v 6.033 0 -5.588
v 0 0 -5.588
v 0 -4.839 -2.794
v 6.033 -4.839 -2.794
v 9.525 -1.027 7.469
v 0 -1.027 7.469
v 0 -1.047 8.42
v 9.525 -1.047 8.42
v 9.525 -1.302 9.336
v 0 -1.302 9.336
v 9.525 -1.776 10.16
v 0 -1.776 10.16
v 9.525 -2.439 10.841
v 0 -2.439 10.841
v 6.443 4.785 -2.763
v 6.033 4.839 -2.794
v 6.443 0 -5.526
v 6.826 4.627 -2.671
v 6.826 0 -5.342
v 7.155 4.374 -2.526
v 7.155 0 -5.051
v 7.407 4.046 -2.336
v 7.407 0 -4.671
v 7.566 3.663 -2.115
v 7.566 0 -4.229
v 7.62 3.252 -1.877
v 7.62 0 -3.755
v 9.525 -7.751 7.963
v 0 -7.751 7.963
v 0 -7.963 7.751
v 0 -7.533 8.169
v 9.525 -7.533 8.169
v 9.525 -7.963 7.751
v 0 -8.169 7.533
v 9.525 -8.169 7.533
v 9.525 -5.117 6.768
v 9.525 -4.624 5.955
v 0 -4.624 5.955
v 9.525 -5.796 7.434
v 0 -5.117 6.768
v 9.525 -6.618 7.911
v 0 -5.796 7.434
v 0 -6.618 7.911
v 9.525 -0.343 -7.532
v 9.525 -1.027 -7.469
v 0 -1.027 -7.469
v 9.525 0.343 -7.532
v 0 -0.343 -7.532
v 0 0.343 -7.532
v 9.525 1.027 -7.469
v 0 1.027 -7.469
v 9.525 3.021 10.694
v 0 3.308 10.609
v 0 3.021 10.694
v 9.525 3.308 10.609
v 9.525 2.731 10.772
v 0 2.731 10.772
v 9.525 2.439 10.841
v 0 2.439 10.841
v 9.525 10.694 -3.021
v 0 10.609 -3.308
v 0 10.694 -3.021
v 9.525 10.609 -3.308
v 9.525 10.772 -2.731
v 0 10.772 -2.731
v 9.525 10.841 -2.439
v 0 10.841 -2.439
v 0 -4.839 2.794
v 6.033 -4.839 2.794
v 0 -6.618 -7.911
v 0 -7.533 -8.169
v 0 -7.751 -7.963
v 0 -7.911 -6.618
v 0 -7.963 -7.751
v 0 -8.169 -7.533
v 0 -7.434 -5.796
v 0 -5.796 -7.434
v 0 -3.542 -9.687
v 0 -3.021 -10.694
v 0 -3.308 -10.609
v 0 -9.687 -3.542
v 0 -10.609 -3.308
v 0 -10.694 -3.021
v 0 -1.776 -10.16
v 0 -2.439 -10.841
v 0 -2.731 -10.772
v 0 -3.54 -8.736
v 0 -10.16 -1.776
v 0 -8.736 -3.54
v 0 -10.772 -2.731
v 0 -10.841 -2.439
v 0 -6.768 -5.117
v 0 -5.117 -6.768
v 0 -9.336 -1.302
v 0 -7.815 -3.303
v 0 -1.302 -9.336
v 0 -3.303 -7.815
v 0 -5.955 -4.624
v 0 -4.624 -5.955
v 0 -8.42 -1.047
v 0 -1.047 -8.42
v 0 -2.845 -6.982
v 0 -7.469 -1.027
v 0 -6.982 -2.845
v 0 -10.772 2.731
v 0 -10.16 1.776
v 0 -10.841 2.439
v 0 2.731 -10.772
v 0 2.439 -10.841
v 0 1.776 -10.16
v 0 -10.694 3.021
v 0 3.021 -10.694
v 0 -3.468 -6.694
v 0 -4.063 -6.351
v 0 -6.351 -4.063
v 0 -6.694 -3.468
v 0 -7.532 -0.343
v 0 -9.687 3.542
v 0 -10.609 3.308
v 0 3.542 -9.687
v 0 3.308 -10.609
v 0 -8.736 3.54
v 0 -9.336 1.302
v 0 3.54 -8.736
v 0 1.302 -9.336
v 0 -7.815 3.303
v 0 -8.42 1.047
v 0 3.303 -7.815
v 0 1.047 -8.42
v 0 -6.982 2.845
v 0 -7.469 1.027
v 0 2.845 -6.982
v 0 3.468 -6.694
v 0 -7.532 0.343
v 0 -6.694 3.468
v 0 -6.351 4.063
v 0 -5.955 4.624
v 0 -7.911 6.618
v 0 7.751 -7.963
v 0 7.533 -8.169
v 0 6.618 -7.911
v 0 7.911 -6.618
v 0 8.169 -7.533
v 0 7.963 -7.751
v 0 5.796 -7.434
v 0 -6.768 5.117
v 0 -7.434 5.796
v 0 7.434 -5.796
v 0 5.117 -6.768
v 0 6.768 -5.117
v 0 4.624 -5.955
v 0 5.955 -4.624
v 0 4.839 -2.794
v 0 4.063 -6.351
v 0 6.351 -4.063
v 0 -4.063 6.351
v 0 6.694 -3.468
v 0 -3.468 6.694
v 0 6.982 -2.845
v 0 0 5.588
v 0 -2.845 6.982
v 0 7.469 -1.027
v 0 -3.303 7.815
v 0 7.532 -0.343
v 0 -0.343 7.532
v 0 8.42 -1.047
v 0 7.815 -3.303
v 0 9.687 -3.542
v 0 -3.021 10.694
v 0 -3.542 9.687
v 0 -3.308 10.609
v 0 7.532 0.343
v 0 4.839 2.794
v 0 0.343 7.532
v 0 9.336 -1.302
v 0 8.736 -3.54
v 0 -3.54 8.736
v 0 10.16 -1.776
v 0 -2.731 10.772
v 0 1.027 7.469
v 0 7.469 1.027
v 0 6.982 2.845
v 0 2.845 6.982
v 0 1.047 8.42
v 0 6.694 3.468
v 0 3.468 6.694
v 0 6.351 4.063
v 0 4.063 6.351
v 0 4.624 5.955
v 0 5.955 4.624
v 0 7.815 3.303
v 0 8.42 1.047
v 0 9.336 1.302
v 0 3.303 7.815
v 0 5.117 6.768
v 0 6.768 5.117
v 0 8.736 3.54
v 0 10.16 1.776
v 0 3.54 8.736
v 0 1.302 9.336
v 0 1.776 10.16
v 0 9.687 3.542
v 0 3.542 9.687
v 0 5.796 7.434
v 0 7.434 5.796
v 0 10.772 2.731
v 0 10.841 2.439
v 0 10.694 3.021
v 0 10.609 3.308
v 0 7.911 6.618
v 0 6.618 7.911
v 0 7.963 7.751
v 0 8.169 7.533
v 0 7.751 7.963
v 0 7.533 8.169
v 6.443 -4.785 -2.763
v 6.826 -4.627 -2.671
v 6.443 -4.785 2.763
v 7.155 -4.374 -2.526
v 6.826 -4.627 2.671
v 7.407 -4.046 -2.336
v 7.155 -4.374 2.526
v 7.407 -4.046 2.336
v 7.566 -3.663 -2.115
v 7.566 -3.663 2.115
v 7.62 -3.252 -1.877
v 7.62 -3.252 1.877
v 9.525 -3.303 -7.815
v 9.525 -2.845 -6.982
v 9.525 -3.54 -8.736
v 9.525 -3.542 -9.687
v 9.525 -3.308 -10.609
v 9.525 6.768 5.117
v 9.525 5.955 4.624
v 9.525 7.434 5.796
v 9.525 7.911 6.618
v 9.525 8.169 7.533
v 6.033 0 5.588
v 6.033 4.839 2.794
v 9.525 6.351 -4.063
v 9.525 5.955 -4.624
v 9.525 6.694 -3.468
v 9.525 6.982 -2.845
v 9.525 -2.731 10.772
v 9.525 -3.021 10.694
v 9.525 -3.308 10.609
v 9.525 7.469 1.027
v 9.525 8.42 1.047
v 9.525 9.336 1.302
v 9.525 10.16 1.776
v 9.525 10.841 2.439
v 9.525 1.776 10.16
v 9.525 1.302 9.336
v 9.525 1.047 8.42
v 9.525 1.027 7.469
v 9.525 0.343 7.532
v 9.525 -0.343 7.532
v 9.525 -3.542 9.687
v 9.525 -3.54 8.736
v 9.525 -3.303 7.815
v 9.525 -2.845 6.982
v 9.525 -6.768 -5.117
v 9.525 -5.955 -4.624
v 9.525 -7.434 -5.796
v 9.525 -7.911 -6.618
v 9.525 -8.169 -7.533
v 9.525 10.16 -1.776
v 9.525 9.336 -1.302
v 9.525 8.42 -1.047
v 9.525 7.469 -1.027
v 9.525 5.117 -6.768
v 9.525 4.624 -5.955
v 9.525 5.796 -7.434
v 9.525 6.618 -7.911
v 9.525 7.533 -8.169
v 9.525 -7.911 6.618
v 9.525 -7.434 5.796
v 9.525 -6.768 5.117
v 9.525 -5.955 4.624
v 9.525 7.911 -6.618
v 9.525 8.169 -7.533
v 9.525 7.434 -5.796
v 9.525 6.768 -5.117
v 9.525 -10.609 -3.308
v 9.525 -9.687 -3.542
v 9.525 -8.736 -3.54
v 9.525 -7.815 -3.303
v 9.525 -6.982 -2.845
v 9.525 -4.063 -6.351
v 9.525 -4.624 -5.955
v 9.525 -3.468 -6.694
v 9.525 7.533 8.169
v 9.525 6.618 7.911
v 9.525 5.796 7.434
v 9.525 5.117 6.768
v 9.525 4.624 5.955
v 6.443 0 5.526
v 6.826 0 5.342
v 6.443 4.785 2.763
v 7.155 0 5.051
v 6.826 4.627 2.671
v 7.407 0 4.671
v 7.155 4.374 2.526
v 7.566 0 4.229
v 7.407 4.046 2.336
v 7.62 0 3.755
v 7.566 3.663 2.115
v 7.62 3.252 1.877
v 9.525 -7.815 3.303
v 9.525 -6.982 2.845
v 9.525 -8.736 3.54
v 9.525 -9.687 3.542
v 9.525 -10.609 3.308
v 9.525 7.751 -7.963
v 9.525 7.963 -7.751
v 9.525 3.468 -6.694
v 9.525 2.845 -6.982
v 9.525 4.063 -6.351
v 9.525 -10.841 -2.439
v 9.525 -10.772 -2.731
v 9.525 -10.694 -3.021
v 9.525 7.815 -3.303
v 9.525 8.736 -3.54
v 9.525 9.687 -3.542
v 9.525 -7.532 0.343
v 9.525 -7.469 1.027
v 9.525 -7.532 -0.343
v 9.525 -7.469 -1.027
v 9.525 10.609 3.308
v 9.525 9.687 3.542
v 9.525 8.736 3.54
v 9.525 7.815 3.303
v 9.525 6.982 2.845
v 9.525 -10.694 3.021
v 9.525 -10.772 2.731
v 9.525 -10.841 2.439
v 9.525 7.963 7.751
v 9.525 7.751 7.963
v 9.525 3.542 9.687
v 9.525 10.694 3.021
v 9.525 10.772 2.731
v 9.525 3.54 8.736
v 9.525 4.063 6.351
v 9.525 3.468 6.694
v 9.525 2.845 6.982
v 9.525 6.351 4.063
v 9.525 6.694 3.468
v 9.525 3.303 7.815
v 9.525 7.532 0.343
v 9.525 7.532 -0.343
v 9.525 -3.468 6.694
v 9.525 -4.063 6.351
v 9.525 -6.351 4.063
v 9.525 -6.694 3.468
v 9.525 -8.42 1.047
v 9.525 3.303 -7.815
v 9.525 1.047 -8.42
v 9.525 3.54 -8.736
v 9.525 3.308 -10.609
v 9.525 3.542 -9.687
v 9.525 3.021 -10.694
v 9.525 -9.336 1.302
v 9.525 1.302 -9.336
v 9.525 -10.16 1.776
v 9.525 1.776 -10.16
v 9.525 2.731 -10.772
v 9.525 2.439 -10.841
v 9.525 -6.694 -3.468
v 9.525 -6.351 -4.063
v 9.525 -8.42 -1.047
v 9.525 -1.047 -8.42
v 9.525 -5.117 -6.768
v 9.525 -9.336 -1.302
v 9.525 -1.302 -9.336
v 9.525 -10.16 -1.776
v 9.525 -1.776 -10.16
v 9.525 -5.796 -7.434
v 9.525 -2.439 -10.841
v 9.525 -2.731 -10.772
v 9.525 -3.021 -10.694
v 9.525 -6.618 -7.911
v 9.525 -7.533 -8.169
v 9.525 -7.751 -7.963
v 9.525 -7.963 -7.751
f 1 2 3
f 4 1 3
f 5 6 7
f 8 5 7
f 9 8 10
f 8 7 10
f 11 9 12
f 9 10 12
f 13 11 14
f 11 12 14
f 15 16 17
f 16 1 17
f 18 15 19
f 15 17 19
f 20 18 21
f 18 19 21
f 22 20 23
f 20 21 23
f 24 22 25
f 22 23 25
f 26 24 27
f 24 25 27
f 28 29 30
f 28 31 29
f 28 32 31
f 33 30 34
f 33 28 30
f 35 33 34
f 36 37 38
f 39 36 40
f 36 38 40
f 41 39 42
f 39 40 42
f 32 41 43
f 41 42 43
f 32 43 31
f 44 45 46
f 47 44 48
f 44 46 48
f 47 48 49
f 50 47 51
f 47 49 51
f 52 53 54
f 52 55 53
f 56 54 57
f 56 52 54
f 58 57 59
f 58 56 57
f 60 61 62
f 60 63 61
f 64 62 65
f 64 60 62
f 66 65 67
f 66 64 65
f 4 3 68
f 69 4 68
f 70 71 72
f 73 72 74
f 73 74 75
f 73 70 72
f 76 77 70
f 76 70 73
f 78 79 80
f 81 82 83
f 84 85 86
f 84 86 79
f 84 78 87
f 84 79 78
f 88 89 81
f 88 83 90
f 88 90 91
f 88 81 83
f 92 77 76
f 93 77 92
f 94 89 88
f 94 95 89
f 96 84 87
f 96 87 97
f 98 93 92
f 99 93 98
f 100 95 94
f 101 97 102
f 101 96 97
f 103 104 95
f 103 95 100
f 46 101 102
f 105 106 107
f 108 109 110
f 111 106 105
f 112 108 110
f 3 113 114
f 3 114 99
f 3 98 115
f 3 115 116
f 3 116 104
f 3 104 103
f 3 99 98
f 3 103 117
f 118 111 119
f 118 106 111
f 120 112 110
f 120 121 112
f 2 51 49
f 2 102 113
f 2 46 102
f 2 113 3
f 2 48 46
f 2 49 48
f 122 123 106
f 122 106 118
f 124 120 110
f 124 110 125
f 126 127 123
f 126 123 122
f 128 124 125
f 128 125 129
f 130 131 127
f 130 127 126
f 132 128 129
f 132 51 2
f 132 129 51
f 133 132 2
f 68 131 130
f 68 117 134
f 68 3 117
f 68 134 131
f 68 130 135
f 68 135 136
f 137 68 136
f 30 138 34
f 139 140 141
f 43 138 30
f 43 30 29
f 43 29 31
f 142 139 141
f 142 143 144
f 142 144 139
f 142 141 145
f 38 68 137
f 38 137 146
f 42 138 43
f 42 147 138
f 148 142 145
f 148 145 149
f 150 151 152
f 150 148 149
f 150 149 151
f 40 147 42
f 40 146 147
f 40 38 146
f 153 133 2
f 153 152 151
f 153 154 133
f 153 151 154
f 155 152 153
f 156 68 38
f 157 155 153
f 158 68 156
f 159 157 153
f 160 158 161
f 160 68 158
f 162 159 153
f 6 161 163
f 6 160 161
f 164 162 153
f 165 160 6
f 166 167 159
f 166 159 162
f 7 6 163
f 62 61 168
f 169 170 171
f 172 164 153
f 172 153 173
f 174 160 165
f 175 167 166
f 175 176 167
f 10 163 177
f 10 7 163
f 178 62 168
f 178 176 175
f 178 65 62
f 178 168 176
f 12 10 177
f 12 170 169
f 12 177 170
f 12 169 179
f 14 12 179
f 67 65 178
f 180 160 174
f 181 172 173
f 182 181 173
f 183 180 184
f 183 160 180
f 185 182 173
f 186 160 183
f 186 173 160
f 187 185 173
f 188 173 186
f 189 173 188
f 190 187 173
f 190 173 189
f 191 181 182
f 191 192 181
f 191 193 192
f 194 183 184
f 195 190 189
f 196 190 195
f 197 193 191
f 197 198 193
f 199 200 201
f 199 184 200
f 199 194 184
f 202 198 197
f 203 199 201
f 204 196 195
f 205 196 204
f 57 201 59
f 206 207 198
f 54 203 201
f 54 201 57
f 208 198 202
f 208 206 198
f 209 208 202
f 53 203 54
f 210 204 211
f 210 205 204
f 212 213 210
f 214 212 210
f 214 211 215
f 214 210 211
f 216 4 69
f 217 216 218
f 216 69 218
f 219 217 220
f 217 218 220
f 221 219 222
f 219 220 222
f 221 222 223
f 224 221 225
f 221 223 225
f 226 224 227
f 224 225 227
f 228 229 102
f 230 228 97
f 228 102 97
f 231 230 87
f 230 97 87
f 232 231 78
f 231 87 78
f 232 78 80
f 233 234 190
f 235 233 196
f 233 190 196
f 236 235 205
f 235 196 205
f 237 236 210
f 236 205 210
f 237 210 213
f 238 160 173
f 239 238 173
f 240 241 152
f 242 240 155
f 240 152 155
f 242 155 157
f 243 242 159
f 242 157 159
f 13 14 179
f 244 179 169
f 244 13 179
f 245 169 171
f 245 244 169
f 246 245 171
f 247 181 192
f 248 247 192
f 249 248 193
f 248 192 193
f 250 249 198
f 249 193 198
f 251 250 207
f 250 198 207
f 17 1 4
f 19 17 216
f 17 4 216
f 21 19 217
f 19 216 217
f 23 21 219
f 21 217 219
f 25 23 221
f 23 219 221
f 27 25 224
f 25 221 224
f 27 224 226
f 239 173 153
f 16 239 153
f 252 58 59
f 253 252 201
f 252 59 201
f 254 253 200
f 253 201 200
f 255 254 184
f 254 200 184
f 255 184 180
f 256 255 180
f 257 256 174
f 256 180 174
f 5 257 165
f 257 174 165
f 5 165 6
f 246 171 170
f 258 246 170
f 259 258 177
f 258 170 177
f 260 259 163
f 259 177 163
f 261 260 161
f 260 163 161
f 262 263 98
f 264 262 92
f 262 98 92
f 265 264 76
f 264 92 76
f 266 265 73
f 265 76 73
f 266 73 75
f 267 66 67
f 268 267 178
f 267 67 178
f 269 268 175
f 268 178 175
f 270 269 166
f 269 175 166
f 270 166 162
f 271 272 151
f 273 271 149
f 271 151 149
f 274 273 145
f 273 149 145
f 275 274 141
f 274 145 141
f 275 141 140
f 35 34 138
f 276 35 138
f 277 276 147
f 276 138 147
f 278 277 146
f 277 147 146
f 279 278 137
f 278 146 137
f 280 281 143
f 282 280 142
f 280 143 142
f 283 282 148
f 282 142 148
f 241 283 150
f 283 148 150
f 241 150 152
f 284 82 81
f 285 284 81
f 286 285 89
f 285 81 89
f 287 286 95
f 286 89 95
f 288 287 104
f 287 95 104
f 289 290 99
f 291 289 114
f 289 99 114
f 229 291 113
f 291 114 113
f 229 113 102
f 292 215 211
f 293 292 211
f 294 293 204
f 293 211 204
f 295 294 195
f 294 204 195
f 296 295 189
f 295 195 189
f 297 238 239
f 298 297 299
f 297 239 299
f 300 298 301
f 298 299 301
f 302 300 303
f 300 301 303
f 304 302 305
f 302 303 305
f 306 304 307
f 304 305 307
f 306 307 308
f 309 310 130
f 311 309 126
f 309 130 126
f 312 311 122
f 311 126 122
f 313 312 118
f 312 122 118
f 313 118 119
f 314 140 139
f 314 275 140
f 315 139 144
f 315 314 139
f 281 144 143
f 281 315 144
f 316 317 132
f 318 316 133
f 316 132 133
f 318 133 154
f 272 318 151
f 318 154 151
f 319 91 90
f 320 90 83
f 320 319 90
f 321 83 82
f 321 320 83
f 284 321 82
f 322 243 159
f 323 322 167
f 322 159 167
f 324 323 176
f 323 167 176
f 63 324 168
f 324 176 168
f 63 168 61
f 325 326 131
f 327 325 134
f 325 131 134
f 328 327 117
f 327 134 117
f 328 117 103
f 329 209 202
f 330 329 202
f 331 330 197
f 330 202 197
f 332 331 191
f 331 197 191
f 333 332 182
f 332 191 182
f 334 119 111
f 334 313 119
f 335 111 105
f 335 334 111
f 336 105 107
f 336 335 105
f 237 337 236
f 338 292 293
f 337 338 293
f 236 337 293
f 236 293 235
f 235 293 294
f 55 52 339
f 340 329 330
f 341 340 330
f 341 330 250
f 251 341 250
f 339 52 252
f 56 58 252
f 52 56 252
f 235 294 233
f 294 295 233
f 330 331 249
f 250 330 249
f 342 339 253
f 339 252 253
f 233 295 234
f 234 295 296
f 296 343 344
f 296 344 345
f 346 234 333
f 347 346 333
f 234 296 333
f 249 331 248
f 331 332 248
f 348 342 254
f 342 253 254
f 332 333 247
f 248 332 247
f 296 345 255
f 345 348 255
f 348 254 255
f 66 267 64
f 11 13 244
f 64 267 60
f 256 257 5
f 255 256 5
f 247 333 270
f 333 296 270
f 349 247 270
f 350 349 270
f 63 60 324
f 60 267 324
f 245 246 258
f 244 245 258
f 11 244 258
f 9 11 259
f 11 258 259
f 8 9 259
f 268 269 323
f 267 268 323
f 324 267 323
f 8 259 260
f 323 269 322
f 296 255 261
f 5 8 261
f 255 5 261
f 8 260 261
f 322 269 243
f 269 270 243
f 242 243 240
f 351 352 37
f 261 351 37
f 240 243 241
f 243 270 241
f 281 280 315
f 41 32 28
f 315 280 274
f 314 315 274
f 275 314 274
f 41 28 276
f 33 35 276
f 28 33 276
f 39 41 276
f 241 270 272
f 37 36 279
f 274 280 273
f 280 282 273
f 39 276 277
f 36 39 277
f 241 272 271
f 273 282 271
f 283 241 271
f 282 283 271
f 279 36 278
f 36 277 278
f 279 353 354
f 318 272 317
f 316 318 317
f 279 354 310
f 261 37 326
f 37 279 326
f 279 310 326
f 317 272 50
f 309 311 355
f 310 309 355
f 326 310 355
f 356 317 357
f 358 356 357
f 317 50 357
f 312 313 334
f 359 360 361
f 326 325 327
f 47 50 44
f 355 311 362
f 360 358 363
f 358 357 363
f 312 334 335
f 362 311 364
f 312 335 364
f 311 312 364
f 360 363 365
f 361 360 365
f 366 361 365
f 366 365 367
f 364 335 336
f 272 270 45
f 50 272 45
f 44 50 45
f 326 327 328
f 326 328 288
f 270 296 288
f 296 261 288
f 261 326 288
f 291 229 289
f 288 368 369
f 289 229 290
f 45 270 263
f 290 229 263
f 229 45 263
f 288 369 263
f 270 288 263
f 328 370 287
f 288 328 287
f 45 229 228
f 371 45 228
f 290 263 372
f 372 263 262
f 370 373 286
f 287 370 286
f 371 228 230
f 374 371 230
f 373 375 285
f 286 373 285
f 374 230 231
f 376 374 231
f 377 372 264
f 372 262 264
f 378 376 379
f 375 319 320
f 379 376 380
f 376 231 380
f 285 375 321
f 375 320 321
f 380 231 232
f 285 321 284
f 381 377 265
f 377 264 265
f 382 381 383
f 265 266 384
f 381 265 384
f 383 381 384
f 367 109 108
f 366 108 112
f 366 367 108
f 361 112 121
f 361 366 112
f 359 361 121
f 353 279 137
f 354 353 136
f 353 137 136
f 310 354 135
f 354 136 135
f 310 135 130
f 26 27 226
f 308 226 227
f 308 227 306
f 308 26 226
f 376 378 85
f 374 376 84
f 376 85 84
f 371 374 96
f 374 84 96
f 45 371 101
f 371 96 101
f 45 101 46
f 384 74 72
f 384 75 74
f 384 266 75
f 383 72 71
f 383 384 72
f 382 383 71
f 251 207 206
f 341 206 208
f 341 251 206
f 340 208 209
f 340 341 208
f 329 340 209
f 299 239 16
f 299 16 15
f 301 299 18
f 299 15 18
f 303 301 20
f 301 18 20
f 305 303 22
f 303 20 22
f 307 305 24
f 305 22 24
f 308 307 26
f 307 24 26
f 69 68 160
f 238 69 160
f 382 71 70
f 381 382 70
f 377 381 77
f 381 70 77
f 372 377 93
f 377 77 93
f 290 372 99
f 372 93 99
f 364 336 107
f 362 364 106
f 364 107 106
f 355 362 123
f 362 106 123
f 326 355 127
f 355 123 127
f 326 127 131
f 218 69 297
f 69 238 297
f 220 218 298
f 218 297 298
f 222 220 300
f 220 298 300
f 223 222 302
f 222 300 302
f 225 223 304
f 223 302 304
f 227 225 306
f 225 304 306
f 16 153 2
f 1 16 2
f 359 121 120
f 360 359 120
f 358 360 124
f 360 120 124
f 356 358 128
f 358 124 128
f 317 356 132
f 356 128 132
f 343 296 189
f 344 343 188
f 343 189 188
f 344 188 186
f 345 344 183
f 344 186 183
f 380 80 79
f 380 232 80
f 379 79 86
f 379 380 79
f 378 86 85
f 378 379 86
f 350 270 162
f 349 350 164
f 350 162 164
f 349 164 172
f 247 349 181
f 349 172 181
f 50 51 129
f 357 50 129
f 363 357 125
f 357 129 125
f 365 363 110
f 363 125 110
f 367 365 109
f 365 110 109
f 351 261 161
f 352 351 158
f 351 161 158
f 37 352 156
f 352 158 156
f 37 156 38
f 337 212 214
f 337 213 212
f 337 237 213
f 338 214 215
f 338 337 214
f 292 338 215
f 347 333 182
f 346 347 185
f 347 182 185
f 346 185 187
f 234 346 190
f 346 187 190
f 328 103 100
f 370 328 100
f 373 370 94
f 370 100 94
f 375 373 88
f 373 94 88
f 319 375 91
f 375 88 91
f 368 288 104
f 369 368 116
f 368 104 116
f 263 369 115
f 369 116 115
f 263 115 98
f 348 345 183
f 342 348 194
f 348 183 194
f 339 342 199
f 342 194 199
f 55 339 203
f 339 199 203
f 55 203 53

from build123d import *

# Parameters (mm, degrees)
BASPROSKE_W         = 9.525
BASPROSKE_H         = 11.1125
TOOTHCUT_DEPTH      = 19.376641083
TEETHCUTS_COUNT     = 12
BORSKE_R            = 3.175
BORE_DEPTH          = 9.525
BOSS_EXTRUDE1_START = -25.4
SKETCH2_R           = 7.539355
BOSS_EXTRUDE1_DEPTH = 25.4
CUT_EXTRUDE1_DEPTH  = 20
SKETCH5_R           = 1.905
CUT_EXTRUDE2_DEPTH  = 24.605363577
SKETCH6_R           = 12.7
SKETCH6_R_2         = 5.7785
CUT_EXTRUDE3_DEPTH  = 15.875
SKETCH7_R           = 5.7785
CUT_EXTRUDE4_DEPTH  = 23.070094739
BOSS_EXTRUDE2_START = 4.125
BOSS_EXTRUDE2_DEPTH = 4.125
CUT_EXTRUDE5_DEPTH  = 7.62
FILLET1_R           = 1.5875


with BuildPart() as part:
    # BasProSke → Base-Revolve (revolve)
    with BuildSketch(Plane(origin=(0, 0, 0), x_dir=(1, 0, 0), z_dir=(0, 1, 0)), mode=Mode.PRIVATE) as base_revolve_sk:
        with Locations((4.7625, 5.55625)):
            Rectangle(BASPROSKE_W, BASPROSKE_H)
    revolve(base_revolve_sk.sketch.rotate(Axis((-10, 0, 0), (1, 0, 0)), 180), axis=Axis((-10, 0, 0), (1, 0, 0)))

    # TooCutSke → ToothCut (cut, through all)
    with BuildSketch(Plane(origin=(0, 0, 0), x_dir=(0, 0, -1), z_dir=(1, 0, 0))):
        with BuildLine():
            ThreePointArc((1.026937745, 7.469087808), (0, 7.539355), (-1.026937745, 7.469087808))
            ThreePointArc((-1.026937745, 7.469087808), (-1.30857978, 9.35080814), (-2.465050847, 10.861691431))
            ThreePointArc((-2.465050847, 10.861691431), (0, 11.1379), (2.465050847, 10.861691431))
            ThreePointArc((2.465050847, 10.861691431), (1.30857978, 9.35080814), (1.026937745, 7.469087808))
        make_face()
    toothcut = extrude(amount=TOOTHCUT_DEPTH, mode=Mode.SUBTRACT)

    # TeethCuts: ToothCut ×12 about axis
    teethcuts_axis = Axis((0, 0, 0), (1, 0, 0))
    for i in range(1, TEETHCUTS_COUNT):
        add(toothcut.rotate(teethcuts_axis, i * 360 / TEETHCUTS_COUNT), mode=Mode.SUBTRACT)

    # BorSke → Bore (cut, symmetric)
    with BuildSketch(Plane(origin=(0, 0, 0), x_dir=(0, 0, -1), z_dir=(1, 0, 0))):
        with Locations(Location((0, 0, 0), (0, 0, 180))):
            Circle(BORSKE_R)
    extrude(amount=BORE_DEPTH, both=True, mode=Mode.SUBTRACT)

    # Sketch2 → Boss-Extrude1 (add)
    with BuildSketch(Plane(origin=(9.525, 0, 0), x_dir=(0, 0, -1), z_dir=(1, 0, 0)).offset(BOSS_EXTRUDE1_START)):
        with Locations(Location((0, 0, 0), (0, 0, 172.171388978))):
            Circle(SKETCH2_R)
    extrude(amount=BOSS_EXTRUDE1_DEPTH)

    # Sketch3 → Cut-Extrude1 (cut)
    with BuildSketch(Plane.ZY.offset(15.875)):
        with BuildLine():
            Line((-1.778, 2.8575), (1.778, 2.8575))
            ThreePointArc((1.778, 2.8575), (0, -3.3655), (-1.778, 2.8575))
        make_face()
    extrude(amount=-CUT_EXTRUDE1_DEPTH, mode=Mode.SUBTRACT)

    # Sketch5 → Cut-Extrude2 (cut, through all)
    with BuildSketch(Plane.XZ.offset(-2.8575)):
        with Locations(Location((-12.065, 0, 0), (0, 0, 270))):
            Circle(SKETCH5_R)
    extrude(amount=-CUT_EXTRUDE2_DEPTH, mode=Mode.SUBTRACT)

    # Sketch6 → Cut-Extrude3 (cut)
    with BuildSketch(Plane.ZY.offset(15.875)):
        Circle(SKETCH6_R)
        Circle(SKETCH6_R_2, mode=Mode.SUBTRACT)
    extrude(amount=-CUT_EXTRUDE3_DEPTH, mode=Mode.SUBTRACT)

    # Sketch7 → Cut-Extrude4 (cut, through all)
    with BuildSketch(Plane.ZY):
        Circle(SKETCH7_R)
    extrude(amount=CUT_EXTRUDE4_DEPTH, mode=Mode.SUBTRACT)

    # Sketch8 → Boss-Extrude2 (add)
    with BuildSketch(Plane.ZY.offset(-4.125).offset(BOSS_EXTRUDE2_START)):
        with BuildLine():
            Line((1.778, 2.8575), (-1.778, 2.8575))
            ThreePointArc((-1.778, 2.8575), (0, -3.3655), (1.778, 2.8575))
        make_face()
    extrude(amount=-BOSS_EXTRUDE2_DEPTH)

    # Sketch9 → Cut-Extrude5 (cut)
    with BuildSketch(Plane.ZY):
        Polygon((5.588, 0), (2.794, 4.839349956), (-2.794, 4.839349956), (-5.588, 0), (-2.794, -4.839349956), (2.794, -4.839349956), align=None)
    extrude(amount=-CUT_EXTRUDE5_DEPTH, mode=Mode.SUBTRACT)

    # Fillet1
    fillet1_edges = [part.edges().sort_by_distance(p)[0] for p in [
        (7.62, 4.839349956, 0),
        (7.62, 2.419674978, 4.191),
        (7.62, -2.419674978, 4.191),
        (7.62, -4.839349956, 0),
        (7.62, -2.419674978, -4.191),
        (7.62, 2.419674978, -4.191),
    ]]
    fillet(fillet1_edges, radius=FILLET1_R)


solid = part.part
